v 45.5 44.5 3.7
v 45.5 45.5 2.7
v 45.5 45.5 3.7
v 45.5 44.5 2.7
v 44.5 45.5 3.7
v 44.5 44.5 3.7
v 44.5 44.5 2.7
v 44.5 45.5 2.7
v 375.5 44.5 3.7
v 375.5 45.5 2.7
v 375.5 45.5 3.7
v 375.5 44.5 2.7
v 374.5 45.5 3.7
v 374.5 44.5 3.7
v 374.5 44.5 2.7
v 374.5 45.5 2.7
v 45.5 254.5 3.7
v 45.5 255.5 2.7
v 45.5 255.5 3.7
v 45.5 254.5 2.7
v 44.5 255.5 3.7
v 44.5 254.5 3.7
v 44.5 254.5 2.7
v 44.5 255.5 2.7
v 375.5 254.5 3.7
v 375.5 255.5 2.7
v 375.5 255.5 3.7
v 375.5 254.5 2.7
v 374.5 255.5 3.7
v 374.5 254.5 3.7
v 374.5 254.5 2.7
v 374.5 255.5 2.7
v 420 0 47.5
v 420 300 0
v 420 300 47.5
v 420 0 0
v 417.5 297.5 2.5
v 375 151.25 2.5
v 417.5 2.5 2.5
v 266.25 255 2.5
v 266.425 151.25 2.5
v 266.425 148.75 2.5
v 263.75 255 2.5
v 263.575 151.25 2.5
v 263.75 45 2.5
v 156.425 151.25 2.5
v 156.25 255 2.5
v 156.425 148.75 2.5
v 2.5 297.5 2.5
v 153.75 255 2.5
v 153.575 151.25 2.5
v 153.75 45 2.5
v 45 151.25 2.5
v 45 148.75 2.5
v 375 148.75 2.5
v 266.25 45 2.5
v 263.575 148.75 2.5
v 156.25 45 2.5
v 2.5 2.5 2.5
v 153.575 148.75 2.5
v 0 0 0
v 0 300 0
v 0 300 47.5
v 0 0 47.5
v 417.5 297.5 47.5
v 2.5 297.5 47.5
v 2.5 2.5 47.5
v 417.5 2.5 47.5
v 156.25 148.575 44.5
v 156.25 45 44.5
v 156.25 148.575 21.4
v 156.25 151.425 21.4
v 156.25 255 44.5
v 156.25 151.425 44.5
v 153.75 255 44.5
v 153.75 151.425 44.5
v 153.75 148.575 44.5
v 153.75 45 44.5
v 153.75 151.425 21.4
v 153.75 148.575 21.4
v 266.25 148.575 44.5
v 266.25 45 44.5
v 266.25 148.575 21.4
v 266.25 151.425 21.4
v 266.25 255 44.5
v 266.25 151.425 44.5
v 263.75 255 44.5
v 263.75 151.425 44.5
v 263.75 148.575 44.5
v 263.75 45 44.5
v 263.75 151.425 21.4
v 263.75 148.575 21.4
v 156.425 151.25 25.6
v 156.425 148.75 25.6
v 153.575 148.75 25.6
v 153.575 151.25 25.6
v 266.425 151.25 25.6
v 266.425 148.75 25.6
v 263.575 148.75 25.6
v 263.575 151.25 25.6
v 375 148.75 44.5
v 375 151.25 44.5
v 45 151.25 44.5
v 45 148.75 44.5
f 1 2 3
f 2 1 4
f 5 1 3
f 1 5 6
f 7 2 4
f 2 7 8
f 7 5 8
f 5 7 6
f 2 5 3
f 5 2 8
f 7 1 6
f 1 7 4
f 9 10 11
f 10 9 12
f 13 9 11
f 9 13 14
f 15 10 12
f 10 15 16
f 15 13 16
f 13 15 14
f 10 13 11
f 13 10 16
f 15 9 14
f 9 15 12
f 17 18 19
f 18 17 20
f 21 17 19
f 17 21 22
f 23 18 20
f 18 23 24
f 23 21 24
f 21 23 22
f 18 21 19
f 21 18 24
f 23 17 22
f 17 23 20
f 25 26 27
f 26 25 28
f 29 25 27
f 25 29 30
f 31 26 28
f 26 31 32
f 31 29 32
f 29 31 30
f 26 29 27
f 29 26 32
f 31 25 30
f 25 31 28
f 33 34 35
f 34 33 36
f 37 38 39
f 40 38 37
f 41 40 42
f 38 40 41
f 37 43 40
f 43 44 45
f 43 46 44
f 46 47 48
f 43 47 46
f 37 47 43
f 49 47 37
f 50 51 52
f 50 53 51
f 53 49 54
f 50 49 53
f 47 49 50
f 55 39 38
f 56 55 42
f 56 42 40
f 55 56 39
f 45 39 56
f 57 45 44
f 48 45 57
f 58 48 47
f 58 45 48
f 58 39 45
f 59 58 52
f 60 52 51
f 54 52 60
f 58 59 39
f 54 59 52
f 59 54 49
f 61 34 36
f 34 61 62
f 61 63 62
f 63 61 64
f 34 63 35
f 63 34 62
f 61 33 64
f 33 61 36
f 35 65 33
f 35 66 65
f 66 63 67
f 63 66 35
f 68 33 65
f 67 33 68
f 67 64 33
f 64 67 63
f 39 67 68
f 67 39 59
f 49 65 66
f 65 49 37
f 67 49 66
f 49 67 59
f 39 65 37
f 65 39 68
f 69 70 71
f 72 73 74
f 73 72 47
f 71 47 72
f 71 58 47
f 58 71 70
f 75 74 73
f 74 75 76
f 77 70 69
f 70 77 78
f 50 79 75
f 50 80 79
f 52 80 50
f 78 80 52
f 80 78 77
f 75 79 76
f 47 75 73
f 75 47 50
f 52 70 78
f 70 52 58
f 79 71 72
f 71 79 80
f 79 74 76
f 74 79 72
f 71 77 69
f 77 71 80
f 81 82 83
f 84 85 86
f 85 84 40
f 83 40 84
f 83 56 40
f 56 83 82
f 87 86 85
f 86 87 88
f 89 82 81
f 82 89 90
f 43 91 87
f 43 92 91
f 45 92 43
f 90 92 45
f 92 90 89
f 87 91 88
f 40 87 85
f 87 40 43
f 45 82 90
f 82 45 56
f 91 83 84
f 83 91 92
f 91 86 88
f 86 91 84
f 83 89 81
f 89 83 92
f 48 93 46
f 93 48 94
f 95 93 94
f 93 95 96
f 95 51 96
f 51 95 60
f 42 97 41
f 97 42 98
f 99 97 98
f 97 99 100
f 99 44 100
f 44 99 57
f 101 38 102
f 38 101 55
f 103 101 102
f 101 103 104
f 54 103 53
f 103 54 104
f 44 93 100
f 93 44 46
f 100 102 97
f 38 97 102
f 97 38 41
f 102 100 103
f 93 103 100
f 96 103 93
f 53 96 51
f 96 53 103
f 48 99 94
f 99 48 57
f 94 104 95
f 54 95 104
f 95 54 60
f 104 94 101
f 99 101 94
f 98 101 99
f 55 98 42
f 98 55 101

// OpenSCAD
// Parametric folded-sheet drawer organizer concept
// Units: millimetres
//
// This model uses one stock sheet for the folded outer tray and separate
// slotted divider plates for flexible pocket sizes. Change STOCK SHEET SIZE
// and GRID below, then open in OpenSCAD and press F5/F6.

/* [View] */
view_mode = "assembled"; // [assembled, flat]
show_labels = true;

/* [Stock sheet size] */
stock_sheet_x = 420;      // full stock sheet width before folding
stock_sheet_y = 300;      // full stock sheet depth before folding
sheet_thickness = 2.5;    // plastic sheet thickness

/* [Folded tray] */
wall_height = 45;         // folded-up outer side height
fold_radius_hint = 2;     // visual only; fold lines are shown in flat mode
corner_gap = 1.0;         // relief gap at folded corners

/* [Grid / pockets] */
cols = 3;                 // pockets across width, e.g. 2 or 3
rows = 2;                 // pockets front-to-back, e.g. 2

/* [Slotted divider plates] */
divider_height = 42;
divider_thickness = 2.5;
slot_clearance = 0.35;
slot_depth_ratio = 0.55;  // each crossing slot depth as fraction of divider height
divider_edge_margin = 8;

/* [Flat layout spacing] */
flat_spacing = 18;
cut_line_width = 0.8;

$fn = 32;
eps = 0.02;

floor_x = stock_sheet_x - 2 * wall_height;
floor_y = stock_sheet_y - 2 * wall_height;
slot_w = divider_thickness + slot_clearance;
slot_d = divider_height * slot_depth_ratio;

assert(floor_x > 20, "stock_sheet_x must be greater than 2 * wall_height + 20");
assert(floor_y > 20, "stock_sheet_y must be greater than 2 * wall_height + 20");
assert(cols >= 1, "cols must be >= 1");
assert(rows >= 1, "rows must be >= 1");

if (view_mode == "assembled") {
    assembled_drawer();
} else {
    flat_cut_layout();
}

module assembled_drawer() {
    color("#e9edf2") tray_body();

    // Front-back divider plates: divide columns.
    for (i = [1 : cols - 1]) {
        x = i * floor_x / cols;
        translate([wall_height + x - divider_thickness / 2, wall_height, sheet_thickness])
            color("#9ecae1") front_back_divider();
    }

    // Left-right divider plates: divide rows.
    for (j = [1 : rows - 1]) {
        y = j * floor_y / rows;
        translate([wall_height, wall_height + y - divider_thickness / 2, sheet_thickness])
            color("#fdae6b") left_right_divider();
    }

    if (show_labels) assembled_labels();
}

module tray_body() {
    // Floor.
    cube([stock_sheet_x, stock_sheet_y, sheet_thickness]);

    // Folded outer walls, shown upright along the four fold lines.
    translate([0, 0, sheet_thickness])
        cube([stock_sheet_x, sheet_thickness, wall_height]);
    translate([0, stock_sheet_y - sheet_thickness, sheet_thickness])
        cube([stock_sheet_x, sheet_thickness, wall_height]);
    translate([0, 0, sheet_thickness])
        cube([sheet_thickness, stock_sheet_y, wall_height]);
    translate([stock_sheet_x - sheet_thickness, 0, sheet_thickness])
        cube([sheet_thickness, stock_sheet_y, wall_height]);

    // Small corner relief markers.
    color("#d95f0e") {
        translate([wall_height - corner_gap / 2, wall_height - corner_gap / 2, sheet_thickness + 0.2])
            cube([corner_gap, corner_gap, 1]);
        translate([stock_sheet_x - wall_height - corner_gap / 2, wall_height - corner_gap / 2, sheet_thickness + 0.2])
            cube([corner_gap, corner_gap, 1]);
        translate([wall_height - corner_gap / 2, stock_sheet_y - wall_height - corner_gap / 2, sheet_thickness + 0.2])
            cube([corner_gap, corner_gap, 1]);
        translate([stock_sheet_x - wall_height - corner_gap / 2, stock_sheet_y - wall_height - corner_gap / 2, sheet_thickness + 0.2])
            cube([corner_gap, corner_gap, 1]);
    }
}

module front_back_divider() {
    // Plate running in Y direction, with top-down slots at row crossings.
    difference() {
        cube([divider_thickness, floor_y, divider_height]);
        for (j = [1 : rows - 1]) {
            y = j * floor_y / rows;
            translate([-eps, y - slot_w / 2, divider_height - slot_d])
                cube([divider_thickness + 2 * eps, slot_w, slot_d + eps]);
        }
    }
}

module left_right_divider() {
    // Plate running in X direction, with bottom-up slots at column crossings.
    difference() {
        cube([floor_x, divider_thickness, divider_height]);
        for (i = [1 : cols - 1]) {
            x = i * floor_x / cols;
            translate([x - slot_w / 2, -eps, -eps])
                cube([slot_w, divider_thickness + 2 * eps, slot_d + eps]);
        }
    }
}

module flat_cut_layout() {
    // One-piece stock sheet flat pattern.
    color("#f7f7f7") cube([stock_sheet_x, stock_sheet_y, sheet_thickness]);

    // Fold lines.
    color("#2b8cbe") {
        line2d([wall_height, 0], [wall_height, stock_sheet_y], cut_line_width);
        line2d([stock_sheet_x - wall_height, 0], [stock_sheet_x - wall_height, stock_sheet_y], cut_line_width);
        line2d([0, wall_height], [stock_sheet_x, wall_height], cut_line_width);
        line2d([0, stock_sheet_y - wall_height], [stock_sheet_x, stock_sheet_y - wall_height], cut_line_width);
    }

    // Corner relief cuts.
    color("#d95f0e") {
        translate([wall_height - corner_gap / 2, wall_height - corner_gap / 2, sheet_thickness])
            cube([corner_gap, corner_gap, 0.8]);
        translate([stock_sheet_x - wall_height - corner_gap / 2, wall_height - corner_gap / 2, sheet_thickness])
            cube([corner_gap, corner_gap, 0.8]);
        translate([wall_height - corner_gap / 2, stock_sheet_y - wall_height - corner_gap / 2, sheet_thickness])
            cube([corner_gap, corner_gap, 0.8]);
        translate([stock_sheet_x - wall_height - corner_gap / 2, stock_sheet_y - wall_height - corner_gap / 2, sheet_thickness])
            cube([corner_gap, corner_gap, 0.8]);
    }

    // Divider plates laid out beside the stock sheet for CNC/laser reference.
    translate([0, -(divider_height + flat_spacing), 0]) flat_front_back_dividers();
    translate([0, -(2 * divider_height + 2 * flat_spacing), 0]) flat_left_right_dividers();

    if (show_labels) flat_labels();
}

module flat_front_back_dividers() {
    count = max(cols - 1, 0);
    for (i = [0 : count - 1]) {
        translate([i * (floor_y + flat_spacing), 0, 0])
            rotate([0, 0, 0]) flat_front_back_plate();
    }
}

module flat_left_right_dividers() {
    count = max(rows - 1, 0);
    for (j = [0 : count - 1]) {
        translate([j * (floor_x + flat_spacing), 0, 0])
            flat_left_right_plate();
    }
}

module flat_front_back_plate() {
    // 2D-looking plate lying flat: length is floor_y, height is divider_height.
    difference() {
        color("#9ecae1") cube([floor_y, divider_height, sheet_thickness]);
        for (j = [1 : rows - 1]) {
            x = j * floor_y / rows;
            translate([x - slot_w / 2, divider_height - slot_d, -eps])
                cube([slot_w, slot_d + eps, sheet_thickness + 2 * eps]);
        }
    }
}

module flat_left_right_plate() {
    // 2D-looking plate lying flat: length is floor_x, height is divider_height.
    difference() {
        color("#fdae6b") cube([floor_x, divider_height, sheet_thickness]);
        for (i = [1 : cols - 1]) {
            x = i * floor_x / cols;
            translate([x - slot_w / 2, -eps, -eps])
                cube([slot_w, slot_d + eps, sheet_thickness + 2 * eps]);
        }
    }
}

module line2d(a, b, w) {
    hull() {
        translate([a[0], a[1], sheet_thickness]) cylinder(h = 0.6, d = w);
        translate([b[0], b[1], sheet_thickness]) cylinder(h = 0.6, d = w);
    }
}

module assembled_labels() {
    echo(str("Stock sheet: ", stock_sheet_x, " x ", stock_sheet_y, " x ", sheet_thickness, " mm"));
    echo(str("Folded floor inside: ", floor_x, " x ", floor_y, " mm"));
    echo(str("Grid: ", cols, " x ", rows, " pockets"));
    echo(str("Pocket approx: ", floor_x / cols, " x ", floor_y / rows, " mm before divider thickness"));
}

module flat_labels() {
    echo("Blue lines = fold lines");
    echo("Orange marks = corner relief cuts");
    echo(str("Divider plates: ", max(cols - 1, 0), " front-back + ", max(rows - 1, 0), " left-right"));
}
